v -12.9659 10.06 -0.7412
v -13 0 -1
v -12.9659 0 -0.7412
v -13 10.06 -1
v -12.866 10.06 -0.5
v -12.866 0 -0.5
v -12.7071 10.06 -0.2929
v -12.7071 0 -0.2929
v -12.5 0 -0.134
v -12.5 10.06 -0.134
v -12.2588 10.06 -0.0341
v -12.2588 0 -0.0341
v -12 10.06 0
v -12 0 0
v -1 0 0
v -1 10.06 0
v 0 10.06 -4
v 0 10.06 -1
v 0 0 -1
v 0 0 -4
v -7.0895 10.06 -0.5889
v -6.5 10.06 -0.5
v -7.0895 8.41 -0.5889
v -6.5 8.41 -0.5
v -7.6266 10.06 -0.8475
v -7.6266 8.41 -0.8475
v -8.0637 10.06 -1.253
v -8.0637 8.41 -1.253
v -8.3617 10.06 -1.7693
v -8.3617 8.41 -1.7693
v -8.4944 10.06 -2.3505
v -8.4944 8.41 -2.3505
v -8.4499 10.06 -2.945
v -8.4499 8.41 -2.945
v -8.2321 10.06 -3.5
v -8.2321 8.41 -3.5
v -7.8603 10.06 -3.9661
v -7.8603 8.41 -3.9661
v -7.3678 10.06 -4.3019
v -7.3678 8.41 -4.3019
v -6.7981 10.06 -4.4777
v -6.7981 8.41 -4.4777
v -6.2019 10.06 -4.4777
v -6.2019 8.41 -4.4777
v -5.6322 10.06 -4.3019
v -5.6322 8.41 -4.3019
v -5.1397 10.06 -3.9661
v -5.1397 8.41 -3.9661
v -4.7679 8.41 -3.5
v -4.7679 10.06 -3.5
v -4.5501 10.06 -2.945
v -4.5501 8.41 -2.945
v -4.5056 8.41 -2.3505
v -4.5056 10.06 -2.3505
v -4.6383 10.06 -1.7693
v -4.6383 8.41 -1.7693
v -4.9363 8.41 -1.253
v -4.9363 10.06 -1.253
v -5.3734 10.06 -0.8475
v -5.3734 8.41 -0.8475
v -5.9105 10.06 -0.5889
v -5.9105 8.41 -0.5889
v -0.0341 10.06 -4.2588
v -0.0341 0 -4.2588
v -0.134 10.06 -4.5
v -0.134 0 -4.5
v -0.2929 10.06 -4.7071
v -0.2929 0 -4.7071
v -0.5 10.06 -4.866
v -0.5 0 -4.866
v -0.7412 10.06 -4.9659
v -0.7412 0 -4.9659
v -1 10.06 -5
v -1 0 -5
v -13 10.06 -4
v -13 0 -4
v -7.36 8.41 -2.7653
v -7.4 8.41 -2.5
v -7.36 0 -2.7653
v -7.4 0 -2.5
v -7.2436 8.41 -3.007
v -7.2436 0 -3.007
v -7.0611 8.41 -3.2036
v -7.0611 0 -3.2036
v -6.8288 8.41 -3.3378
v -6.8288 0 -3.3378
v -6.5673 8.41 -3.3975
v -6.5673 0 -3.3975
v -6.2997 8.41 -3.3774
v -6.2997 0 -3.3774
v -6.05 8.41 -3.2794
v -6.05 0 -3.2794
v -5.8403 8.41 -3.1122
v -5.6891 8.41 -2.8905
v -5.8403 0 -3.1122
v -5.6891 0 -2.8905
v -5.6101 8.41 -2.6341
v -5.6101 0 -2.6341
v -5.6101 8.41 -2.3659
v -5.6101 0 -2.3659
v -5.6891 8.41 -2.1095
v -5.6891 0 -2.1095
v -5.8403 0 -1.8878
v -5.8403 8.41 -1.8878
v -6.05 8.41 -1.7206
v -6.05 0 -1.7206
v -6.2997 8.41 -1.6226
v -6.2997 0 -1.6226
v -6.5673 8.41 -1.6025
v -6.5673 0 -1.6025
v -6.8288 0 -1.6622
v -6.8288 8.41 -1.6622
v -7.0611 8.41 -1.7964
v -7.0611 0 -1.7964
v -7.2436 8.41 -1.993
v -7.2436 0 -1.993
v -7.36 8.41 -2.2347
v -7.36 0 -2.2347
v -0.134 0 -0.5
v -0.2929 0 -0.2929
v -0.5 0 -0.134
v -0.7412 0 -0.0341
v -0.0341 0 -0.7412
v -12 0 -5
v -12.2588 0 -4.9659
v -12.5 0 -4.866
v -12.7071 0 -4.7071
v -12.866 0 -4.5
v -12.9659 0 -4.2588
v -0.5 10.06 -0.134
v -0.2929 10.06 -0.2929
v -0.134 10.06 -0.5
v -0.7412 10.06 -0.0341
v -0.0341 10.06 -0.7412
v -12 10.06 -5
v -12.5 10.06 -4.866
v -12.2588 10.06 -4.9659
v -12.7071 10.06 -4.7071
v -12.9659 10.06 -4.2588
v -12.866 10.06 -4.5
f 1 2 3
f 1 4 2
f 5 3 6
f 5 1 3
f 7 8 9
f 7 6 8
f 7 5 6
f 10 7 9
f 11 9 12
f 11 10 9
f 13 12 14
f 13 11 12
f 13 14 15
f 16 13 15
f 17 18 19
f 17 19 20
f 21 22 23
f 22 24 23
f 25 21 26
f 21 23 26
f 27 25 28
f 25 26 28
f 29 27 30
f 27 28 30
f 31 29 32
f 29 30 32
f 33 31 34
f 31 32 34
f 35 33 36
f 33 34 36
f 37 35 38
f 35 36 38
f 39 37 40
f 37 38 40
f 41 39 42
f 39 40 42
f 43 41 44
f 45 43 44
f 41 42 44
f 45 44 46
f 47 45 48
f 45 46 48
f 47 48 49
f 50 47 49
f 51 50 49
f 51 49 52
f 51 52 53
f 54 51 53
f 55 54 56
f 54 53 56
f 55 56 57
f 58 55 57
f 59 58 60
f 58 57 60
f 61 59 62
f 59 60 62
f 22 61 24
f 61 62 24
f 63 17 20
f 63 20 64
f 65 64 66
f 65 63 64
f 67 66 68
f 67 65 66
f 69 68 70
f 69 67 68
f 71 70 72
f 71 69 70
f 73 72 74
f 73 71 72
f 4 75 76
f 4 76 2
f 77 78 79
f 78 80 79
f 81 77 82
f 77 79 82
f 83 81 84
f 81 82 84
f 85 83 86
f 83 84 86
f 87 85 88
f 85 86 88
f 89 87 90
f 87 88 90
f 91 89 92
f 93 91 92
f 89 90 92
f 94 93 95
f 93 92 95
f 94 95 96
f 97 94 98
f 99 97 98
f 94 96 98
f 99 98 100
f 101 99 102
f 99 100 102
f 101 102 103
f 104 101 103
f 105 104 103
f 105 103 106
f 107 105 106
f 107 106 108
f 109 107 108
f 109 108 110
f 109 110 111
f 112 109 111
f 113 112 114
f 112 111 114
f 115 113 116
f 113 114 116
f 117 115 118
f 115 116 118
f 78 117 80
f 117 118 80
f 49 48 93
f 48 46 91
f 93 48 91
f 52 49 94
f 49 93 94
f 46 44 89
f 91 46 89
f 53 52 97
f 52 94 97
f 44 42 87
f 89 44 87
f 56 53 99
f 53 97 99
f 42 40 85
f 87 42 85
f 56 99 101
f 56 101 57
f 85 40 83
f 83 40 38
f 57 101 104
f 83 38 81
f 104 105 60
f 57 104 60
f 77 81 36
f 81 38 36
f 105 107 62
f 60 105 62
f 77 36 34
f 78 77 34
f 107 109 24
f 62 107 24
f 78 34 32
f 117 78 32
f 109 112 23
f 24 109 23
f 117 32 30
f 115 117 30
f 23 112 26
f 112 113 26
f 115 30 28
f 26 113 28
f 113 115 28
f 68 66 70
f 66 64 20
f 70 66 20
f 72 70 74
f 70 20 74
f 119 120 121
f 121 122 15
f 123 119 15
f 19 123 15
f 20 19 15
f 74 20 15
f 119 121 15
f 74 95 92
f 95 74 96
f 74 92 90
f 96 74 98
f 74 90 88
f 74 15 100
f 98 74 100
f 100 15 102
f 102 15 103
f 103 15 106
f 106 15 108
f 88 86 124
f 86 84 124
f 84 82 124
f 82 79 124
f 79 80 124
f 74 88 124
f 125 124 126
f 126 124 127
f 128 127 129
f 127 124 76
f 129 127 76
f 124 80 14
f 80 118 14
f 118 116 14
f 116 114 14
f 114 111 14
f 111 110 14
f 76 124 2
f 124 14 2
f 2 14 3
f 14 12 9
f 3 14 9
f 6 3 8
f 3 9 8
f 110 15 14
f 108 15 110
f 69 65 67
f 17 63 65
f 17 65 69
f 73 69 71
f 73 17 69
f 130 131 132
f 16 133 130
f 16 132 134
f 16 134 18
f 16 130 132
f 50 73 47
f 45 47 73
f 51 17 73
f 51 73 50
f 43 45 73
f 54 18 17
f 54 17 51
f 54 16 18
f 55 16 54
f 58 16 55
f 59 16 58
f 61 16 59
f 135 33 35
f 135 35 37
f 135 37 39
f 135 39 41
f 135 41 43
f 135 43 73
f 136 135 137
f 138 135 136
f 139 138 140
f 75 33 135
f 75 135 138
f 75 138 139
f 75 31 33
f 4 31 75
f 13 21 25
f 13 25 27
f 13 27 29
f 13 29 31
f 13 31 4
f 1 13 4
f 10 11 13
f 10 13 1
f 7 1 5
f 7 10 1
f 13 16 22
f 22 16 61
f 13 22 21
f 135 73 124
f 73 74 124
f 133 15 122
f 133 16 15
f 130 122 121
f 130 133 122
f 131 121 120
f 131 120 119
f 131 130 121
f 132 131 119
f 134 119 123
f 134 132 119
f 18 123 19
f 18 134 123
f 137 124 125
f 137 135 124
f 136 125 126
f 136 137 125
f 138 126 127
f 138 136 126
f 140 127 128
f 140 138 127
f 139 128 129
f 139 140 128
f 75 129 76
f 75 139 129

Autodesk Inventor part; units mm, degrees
ref_plane "YZ Plane" through (0, 0, 0) normal (1, 0, 0) x (0, 1, 0)
ref_plane "XZ Plane" through (0, 0, 0) normal (0, 1, 0) x (-1, 0, 0)
ref_plane "XY Plane" through (0, 0, 0) normal (0, 0, 1) x (1, 0, 0)
sketch "Boceto1" plane through (0, 0, 0) normal (0, 1, 0) x (-1, 0, 0)
  line L0 (0, 0) -> (0, -5)
  line L1 (0, -5) -> (13, -5)
  line L2 (13, -5) -> (13, 0)
  line L3 (13, 0) -> (0, 0)
  circle A0 centre (6.5, -2.5) radius 0.9
  dimension "d0" = 5
  dimension "d1" = 13
  dimension "d2" = 1.8
extrude "Extrusión1" add sketch "Boceto1" along normal blind 10.06
sketch "Boceto2" plane through (0, 10.06, 0) normal (0, 1, 0) x (1, 0, 0)
  circle A0 centre (-6.5, 2.5) radius 0.9 projected
  point P0 (0, 0)
hole "Agujero1" at (-6.5, 10.06, -2.5) direction (0, -1, 0) diameter 4 depth 1.65
fillet "Empalme1" radius 1 4 edges at (0, 5.03, 0) (0, 5.03, -5) (-13, 5.03, 0) (-13, 5.03, -5)
properties part number "Soporte placa A1 - A2"
